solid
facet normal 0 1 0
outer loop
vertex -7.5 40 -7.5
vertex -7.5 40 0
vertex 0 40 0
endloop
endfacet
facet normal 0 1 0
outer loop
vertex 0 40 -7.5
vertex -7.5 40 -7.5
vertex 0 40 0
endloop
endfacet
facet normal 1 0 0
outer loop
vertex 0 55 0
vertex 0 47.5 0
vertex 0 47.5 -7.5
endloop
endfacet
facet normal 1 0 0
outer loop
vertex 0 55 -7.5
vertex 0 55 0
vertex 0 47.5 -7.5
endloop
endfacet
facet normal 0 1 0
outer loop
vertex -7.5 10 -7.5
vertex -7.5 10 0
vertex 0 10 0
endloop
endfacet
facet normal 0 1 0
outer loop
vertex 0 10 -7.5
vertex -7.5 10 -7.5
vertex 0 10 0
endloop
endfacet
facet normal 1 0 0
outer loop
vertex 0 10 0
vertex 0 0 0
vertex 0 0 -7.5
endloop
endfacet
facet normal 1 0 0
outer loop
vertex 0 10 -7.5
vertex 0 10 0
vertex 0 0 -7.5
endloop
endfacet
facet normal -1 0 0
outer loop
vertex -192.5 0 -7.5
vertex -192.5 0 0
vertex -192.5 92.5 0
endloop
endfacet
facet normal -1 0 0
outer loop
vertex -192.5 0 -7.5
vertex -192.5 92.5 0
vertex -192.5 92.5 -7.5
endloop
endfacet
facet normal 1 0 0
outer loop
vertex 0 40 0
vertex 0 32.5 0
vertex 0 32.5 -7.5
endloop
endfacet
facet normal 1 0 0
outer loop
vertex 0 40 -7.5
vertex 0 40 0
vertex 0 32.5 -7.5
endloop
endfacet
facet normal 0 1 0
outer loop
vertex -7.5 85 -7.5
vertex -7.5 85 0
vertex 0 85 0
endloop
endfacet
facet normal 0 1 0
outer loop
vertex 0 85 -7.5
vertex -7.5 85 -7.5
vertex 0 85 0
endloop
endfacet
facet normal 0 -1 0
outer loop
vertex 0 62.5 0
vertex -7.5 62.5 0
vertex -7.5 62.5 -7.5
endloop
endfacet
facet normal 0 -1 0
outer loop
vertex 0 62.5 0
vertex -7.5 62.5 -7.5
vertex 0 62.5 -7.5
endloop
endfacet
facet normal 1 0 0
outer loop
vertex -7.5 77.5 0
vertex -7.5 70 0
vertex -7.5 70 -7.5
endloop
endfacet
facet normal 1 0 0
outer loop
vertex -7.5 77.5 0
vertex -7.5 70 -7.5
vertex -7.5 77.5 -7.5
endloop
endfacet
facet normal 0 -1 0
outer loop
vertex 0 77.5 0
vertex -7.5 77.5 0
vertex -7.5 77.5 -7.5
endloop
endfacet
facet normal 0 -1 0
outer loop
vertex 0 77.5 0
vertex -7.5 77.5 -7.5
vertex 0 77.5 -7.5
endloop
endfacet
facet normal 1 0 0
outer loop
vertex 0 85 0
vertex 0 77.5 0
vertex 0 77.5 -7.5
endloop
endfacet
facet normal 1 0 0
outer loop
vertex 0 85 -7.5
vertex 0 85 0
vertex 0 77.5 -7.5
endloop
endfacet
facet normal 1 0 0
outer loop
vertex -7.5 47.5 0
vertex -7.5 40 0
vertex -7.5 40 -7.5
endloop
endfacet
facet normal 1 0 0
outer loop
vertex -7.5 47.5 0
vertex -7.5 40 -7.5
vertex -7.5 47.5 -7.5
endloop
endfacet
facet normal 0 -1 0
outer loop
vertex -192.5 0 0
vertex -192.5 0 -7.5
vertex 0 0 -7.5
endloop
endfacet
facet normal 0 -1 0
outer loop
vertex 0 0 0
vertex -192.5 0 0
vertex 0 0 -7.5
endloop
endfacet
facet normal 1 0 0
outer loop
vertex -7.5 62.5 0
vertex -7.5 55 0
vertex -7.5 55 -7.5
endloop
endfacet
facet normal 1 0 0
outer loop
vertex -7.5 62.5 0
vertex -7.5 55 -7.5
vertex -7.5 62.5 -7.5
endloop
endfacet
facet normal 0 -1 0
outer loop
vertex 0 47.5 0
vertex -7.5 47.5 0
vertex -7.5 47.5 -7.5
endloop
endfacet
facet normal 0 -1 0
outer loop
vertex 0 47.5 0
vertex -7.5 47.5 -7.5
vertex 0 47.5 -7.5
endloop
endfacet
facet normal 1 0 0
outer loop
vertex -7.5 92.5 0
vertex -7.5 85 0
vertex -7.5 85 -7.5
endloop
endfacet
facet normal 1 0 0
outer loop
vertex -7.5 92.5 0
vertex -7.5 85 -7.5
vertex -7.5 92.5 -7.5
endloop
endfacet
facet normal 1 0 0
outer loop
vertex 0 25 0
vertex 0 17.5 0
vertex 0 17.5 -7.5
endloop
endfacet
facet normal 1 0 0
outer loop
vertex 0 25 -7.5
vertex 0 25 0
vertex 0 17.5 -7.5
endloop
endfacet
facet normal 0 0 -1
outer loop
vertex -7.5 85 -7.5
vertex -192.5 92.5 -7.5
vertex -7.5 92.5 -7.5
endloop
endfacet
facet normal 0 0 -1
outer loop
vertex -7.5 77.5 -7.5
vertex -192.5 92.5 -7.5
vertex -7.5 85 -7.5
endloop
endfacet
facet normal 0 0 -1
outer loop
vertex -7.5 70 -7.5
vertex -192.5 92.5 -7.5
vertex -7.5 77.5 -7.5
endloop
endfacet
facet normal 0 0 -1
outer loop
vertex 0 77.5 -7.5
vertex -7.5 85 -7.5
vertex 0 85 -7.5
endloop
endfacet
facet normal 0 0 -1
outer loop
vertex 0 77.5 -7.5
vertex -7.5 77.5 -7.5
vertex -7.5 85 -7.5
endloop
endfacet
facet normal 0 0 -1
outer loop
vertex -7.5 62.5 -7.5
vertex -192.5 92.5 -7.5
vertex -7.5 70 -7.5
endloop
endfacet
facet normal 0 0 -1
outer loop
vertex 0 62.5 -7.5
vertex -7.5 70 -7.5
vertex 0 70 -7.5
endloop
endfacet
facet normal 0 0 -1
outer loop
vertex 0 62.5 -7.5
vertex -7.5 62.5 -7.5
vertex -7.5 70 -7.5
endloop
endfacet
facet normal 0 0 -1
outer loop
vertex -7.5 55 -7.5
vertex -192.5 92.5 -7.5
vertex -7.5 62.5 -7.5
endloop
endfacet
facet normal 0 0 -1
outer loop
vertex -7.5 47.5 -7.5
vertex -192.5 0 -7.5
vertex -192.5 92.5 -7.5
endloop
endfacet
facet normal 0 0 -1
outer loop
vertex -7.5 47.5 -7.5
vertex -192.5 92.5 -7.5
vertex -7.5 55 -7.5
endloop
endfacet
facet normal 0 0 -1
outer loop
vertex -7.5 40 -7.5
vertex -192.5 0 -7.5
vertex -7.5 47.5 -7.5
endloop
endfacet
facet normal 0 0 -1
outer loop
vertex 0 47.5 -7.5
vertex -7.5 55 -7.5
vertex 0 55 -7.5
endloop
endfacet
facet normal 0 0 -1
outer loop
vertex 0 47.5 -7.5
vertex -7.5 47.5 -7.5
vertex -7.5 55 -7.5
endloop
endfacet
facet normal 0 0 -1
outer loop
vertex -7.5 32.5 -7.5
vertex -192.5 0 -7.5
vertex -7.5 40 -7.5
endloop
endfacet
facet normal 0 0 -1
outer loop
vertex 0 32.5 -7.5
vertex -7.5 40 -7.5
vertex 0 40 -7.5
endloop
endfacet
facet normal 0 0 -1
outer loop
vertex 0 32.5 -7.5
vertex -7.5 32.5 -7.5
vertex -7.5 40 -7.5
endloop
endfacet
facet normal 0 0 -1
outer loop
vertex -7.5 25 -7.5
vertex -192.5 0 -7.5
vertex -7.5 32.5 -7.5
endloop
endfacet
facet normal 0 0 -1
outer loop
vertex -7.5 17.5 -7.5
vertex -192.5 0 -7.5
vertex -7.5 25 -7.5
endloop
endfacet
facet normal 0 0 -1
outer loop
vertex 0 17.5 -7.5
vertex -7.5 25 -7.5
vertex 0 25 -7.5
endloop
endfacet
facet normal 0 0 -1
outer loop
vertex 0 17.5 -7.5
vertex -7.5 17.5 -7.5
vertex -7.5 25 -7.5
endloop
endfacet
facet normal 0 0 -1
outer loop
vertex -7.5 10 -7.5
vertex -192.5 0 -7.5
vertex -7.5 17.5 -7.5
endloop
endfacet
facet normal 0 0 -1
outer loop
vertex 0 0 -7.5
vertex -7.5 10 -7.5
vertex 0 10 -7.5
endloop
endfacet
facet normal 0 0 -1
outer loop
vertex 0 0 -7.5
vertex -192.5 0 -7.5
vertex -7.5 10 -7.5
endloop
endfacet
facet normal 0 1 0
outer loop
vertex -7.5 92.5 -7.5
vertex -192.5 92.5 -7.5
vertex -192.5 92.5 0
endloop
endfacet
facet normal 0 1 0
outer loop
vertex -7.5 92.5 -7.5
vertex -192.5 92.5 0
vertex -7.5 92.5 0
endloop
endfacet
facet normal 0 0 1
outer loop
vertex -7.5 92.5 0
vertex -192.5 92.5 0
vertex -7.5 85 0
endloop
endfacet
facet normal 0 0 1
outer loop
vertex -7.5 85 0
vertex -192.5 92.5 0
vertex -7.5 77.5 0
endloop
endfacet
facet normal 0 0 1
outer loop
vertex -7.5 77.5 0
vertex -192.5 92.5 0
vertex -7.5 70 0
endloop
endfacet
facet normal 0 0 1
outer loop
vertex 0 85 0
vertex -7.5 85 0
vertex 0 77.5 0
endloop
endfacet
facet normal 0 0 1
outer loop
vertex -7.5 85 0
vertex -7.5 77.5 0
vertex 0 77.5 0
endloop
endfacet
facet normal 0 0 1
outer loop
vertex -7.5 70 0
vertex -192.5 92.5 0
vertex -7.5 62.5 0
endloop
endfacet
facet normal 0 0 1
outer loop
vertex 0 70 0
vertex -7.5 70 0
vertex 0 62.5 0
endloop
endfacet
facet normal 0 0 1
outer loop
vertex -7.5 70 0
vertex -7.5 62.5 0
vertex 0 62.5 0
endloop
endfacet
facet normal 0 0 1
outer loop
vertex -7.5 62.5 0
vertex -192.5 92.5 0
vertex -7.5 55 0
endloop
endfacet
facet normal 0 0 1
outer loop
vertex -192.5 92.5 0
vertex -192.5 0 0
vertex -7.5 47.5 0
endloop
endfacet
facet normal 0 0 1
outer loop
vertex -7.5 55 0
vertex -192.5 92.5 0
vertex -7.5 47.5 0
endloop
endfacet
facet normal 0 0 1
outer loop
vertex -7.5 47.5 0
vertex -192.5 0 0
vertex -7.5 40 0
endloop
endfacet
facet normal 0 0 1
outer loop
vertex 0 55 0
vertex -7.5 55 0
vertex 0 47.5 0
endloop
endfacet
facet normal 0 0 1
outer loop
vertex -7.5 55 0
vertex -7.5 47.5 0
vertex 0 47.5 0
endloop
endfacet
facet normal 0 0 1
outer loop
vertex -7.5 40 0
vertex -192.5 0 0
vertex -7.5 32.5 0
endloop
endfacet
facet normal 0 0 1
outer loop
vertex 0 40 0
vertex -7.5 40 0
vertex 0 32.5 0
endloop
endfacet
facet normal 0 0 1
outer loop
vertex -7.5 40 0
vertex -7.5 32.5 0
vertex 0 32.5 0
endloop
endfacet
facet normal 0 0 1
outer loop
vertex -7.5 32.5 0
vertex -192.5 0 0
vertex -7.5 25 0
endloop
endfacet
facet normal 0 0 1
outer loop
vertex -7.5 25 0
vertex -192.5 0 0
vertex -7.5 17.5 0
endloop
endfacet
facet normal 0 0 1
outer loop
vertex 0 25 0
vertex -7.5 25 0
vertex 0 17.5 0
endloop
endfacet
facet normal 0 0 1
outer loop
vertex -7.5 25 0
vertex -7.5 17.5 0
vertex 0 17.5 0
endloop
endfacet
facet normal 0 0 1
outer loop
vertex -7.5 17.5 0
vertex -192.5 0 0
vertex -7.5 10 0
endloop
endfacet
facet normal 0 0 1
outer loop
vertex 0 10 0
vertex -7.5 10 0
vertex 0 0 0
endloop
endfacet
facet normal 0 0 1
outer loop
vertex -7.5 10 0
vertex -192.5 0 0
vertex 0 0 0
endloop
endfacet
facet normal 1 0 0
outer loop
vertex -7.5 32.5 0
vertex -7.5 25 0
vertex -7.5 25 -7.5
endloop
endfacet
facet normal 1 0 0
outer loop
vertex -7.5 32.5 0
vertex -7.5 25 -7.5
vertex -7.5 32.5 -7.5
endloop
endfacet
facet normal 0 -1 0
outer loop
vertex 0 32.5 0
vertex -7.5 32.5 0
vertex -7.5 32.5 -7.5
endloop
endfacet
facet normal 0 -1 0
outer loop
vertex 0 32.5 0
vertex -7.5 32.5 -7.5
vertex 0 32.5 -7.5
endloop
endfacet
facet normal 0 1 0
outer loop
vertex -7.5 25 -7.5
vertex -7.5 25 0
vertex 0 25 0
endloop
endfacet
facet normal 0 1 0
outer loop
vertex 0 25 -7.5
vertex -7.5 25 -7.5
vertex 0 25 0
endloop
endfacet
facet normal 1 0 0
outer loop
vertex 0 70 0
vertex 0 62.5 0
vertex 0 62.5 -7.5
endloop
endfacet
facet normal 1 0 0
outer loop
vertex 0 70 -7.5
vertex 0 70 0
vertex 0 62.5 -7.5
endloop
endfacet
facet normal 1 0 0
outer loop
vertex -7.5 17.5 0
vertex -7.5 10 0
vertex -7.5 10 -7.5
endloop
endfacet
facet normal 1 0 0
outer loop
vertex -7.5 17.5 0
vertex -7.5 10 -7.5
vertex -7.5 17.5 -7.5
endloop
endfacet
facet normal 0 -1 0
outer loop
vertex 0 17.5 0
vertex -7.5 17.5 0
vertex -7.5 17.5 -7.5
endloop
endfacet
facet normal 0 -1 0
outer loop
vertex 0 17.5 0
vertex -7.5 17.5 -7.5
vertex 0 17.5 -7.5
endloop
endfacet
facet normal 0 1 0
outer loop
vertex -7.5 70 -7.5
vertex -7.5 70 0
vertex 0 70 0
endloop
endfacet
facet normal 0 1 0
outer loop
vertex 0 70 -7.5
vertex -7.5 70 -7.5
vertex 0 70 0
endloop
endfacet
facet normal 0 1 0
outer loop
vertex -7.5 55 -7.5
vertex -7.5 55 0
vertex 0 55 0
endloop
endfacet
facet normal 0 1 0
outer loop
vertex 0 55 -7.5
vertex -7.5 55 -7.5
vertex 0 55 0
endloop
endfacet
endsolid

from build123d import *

# Parameters (mm, degrees)
SKETCH1_W           = 192.5
SKETCH1_H           = 7.5
BOSS_EXTRUDE1_DEPTH = 92.5
SKETCH4_W           = 7.5
SKETCH4_H           = 7.5
CUT_EXTRUDE1_DEPTH  = 92.5


with BuildPart() as part:
    # Sketch1 → Boss-Extrude1 (new body)
    with BuildSketch(Plane(origin=(0, 0, 0), x_dir=(1, 0, 0), z_dir=(0, 1, 0))):
        with Locations((-96.25, 3.75)):
            Rectangle(SKETCH1_W, SKETCH1_H)
    extrude(amount=BOSS_EXTRUDE1_DEPTH)

    # Sketch4 → Cut-Extrude1 (cut)
    with BuildSketch(Plane.XY):
        with Locations((-3.75, 88.75)):
            Rectangle(SKETCH4_W, SKETCH4_H)
        with Locations((-3.75, 73.75)):
            Rectangle(SKETCH4_W, SKETCH4_H)
        with Locations((-3.75, 58.75)):
            Rectangle(SKETCH4_W, SKETCH4_H)
        with Locations((-3.75, 43.75)):
            Rectangle(SKETCH4_W, SKETCH4_H)
        with Locations((-3.75, 28.75)):
            Rectangle(SKETCH4_W, SKETCH4_H)
        with Locations((-3.75, 13.75)):
            Rectangle(SKETCH4_W, SKETCH4_H)
    extrude(amount=-CUT_EXTRUDE1_DEPTH, mode=Mode.SUBTRACT)


solid = part.part
